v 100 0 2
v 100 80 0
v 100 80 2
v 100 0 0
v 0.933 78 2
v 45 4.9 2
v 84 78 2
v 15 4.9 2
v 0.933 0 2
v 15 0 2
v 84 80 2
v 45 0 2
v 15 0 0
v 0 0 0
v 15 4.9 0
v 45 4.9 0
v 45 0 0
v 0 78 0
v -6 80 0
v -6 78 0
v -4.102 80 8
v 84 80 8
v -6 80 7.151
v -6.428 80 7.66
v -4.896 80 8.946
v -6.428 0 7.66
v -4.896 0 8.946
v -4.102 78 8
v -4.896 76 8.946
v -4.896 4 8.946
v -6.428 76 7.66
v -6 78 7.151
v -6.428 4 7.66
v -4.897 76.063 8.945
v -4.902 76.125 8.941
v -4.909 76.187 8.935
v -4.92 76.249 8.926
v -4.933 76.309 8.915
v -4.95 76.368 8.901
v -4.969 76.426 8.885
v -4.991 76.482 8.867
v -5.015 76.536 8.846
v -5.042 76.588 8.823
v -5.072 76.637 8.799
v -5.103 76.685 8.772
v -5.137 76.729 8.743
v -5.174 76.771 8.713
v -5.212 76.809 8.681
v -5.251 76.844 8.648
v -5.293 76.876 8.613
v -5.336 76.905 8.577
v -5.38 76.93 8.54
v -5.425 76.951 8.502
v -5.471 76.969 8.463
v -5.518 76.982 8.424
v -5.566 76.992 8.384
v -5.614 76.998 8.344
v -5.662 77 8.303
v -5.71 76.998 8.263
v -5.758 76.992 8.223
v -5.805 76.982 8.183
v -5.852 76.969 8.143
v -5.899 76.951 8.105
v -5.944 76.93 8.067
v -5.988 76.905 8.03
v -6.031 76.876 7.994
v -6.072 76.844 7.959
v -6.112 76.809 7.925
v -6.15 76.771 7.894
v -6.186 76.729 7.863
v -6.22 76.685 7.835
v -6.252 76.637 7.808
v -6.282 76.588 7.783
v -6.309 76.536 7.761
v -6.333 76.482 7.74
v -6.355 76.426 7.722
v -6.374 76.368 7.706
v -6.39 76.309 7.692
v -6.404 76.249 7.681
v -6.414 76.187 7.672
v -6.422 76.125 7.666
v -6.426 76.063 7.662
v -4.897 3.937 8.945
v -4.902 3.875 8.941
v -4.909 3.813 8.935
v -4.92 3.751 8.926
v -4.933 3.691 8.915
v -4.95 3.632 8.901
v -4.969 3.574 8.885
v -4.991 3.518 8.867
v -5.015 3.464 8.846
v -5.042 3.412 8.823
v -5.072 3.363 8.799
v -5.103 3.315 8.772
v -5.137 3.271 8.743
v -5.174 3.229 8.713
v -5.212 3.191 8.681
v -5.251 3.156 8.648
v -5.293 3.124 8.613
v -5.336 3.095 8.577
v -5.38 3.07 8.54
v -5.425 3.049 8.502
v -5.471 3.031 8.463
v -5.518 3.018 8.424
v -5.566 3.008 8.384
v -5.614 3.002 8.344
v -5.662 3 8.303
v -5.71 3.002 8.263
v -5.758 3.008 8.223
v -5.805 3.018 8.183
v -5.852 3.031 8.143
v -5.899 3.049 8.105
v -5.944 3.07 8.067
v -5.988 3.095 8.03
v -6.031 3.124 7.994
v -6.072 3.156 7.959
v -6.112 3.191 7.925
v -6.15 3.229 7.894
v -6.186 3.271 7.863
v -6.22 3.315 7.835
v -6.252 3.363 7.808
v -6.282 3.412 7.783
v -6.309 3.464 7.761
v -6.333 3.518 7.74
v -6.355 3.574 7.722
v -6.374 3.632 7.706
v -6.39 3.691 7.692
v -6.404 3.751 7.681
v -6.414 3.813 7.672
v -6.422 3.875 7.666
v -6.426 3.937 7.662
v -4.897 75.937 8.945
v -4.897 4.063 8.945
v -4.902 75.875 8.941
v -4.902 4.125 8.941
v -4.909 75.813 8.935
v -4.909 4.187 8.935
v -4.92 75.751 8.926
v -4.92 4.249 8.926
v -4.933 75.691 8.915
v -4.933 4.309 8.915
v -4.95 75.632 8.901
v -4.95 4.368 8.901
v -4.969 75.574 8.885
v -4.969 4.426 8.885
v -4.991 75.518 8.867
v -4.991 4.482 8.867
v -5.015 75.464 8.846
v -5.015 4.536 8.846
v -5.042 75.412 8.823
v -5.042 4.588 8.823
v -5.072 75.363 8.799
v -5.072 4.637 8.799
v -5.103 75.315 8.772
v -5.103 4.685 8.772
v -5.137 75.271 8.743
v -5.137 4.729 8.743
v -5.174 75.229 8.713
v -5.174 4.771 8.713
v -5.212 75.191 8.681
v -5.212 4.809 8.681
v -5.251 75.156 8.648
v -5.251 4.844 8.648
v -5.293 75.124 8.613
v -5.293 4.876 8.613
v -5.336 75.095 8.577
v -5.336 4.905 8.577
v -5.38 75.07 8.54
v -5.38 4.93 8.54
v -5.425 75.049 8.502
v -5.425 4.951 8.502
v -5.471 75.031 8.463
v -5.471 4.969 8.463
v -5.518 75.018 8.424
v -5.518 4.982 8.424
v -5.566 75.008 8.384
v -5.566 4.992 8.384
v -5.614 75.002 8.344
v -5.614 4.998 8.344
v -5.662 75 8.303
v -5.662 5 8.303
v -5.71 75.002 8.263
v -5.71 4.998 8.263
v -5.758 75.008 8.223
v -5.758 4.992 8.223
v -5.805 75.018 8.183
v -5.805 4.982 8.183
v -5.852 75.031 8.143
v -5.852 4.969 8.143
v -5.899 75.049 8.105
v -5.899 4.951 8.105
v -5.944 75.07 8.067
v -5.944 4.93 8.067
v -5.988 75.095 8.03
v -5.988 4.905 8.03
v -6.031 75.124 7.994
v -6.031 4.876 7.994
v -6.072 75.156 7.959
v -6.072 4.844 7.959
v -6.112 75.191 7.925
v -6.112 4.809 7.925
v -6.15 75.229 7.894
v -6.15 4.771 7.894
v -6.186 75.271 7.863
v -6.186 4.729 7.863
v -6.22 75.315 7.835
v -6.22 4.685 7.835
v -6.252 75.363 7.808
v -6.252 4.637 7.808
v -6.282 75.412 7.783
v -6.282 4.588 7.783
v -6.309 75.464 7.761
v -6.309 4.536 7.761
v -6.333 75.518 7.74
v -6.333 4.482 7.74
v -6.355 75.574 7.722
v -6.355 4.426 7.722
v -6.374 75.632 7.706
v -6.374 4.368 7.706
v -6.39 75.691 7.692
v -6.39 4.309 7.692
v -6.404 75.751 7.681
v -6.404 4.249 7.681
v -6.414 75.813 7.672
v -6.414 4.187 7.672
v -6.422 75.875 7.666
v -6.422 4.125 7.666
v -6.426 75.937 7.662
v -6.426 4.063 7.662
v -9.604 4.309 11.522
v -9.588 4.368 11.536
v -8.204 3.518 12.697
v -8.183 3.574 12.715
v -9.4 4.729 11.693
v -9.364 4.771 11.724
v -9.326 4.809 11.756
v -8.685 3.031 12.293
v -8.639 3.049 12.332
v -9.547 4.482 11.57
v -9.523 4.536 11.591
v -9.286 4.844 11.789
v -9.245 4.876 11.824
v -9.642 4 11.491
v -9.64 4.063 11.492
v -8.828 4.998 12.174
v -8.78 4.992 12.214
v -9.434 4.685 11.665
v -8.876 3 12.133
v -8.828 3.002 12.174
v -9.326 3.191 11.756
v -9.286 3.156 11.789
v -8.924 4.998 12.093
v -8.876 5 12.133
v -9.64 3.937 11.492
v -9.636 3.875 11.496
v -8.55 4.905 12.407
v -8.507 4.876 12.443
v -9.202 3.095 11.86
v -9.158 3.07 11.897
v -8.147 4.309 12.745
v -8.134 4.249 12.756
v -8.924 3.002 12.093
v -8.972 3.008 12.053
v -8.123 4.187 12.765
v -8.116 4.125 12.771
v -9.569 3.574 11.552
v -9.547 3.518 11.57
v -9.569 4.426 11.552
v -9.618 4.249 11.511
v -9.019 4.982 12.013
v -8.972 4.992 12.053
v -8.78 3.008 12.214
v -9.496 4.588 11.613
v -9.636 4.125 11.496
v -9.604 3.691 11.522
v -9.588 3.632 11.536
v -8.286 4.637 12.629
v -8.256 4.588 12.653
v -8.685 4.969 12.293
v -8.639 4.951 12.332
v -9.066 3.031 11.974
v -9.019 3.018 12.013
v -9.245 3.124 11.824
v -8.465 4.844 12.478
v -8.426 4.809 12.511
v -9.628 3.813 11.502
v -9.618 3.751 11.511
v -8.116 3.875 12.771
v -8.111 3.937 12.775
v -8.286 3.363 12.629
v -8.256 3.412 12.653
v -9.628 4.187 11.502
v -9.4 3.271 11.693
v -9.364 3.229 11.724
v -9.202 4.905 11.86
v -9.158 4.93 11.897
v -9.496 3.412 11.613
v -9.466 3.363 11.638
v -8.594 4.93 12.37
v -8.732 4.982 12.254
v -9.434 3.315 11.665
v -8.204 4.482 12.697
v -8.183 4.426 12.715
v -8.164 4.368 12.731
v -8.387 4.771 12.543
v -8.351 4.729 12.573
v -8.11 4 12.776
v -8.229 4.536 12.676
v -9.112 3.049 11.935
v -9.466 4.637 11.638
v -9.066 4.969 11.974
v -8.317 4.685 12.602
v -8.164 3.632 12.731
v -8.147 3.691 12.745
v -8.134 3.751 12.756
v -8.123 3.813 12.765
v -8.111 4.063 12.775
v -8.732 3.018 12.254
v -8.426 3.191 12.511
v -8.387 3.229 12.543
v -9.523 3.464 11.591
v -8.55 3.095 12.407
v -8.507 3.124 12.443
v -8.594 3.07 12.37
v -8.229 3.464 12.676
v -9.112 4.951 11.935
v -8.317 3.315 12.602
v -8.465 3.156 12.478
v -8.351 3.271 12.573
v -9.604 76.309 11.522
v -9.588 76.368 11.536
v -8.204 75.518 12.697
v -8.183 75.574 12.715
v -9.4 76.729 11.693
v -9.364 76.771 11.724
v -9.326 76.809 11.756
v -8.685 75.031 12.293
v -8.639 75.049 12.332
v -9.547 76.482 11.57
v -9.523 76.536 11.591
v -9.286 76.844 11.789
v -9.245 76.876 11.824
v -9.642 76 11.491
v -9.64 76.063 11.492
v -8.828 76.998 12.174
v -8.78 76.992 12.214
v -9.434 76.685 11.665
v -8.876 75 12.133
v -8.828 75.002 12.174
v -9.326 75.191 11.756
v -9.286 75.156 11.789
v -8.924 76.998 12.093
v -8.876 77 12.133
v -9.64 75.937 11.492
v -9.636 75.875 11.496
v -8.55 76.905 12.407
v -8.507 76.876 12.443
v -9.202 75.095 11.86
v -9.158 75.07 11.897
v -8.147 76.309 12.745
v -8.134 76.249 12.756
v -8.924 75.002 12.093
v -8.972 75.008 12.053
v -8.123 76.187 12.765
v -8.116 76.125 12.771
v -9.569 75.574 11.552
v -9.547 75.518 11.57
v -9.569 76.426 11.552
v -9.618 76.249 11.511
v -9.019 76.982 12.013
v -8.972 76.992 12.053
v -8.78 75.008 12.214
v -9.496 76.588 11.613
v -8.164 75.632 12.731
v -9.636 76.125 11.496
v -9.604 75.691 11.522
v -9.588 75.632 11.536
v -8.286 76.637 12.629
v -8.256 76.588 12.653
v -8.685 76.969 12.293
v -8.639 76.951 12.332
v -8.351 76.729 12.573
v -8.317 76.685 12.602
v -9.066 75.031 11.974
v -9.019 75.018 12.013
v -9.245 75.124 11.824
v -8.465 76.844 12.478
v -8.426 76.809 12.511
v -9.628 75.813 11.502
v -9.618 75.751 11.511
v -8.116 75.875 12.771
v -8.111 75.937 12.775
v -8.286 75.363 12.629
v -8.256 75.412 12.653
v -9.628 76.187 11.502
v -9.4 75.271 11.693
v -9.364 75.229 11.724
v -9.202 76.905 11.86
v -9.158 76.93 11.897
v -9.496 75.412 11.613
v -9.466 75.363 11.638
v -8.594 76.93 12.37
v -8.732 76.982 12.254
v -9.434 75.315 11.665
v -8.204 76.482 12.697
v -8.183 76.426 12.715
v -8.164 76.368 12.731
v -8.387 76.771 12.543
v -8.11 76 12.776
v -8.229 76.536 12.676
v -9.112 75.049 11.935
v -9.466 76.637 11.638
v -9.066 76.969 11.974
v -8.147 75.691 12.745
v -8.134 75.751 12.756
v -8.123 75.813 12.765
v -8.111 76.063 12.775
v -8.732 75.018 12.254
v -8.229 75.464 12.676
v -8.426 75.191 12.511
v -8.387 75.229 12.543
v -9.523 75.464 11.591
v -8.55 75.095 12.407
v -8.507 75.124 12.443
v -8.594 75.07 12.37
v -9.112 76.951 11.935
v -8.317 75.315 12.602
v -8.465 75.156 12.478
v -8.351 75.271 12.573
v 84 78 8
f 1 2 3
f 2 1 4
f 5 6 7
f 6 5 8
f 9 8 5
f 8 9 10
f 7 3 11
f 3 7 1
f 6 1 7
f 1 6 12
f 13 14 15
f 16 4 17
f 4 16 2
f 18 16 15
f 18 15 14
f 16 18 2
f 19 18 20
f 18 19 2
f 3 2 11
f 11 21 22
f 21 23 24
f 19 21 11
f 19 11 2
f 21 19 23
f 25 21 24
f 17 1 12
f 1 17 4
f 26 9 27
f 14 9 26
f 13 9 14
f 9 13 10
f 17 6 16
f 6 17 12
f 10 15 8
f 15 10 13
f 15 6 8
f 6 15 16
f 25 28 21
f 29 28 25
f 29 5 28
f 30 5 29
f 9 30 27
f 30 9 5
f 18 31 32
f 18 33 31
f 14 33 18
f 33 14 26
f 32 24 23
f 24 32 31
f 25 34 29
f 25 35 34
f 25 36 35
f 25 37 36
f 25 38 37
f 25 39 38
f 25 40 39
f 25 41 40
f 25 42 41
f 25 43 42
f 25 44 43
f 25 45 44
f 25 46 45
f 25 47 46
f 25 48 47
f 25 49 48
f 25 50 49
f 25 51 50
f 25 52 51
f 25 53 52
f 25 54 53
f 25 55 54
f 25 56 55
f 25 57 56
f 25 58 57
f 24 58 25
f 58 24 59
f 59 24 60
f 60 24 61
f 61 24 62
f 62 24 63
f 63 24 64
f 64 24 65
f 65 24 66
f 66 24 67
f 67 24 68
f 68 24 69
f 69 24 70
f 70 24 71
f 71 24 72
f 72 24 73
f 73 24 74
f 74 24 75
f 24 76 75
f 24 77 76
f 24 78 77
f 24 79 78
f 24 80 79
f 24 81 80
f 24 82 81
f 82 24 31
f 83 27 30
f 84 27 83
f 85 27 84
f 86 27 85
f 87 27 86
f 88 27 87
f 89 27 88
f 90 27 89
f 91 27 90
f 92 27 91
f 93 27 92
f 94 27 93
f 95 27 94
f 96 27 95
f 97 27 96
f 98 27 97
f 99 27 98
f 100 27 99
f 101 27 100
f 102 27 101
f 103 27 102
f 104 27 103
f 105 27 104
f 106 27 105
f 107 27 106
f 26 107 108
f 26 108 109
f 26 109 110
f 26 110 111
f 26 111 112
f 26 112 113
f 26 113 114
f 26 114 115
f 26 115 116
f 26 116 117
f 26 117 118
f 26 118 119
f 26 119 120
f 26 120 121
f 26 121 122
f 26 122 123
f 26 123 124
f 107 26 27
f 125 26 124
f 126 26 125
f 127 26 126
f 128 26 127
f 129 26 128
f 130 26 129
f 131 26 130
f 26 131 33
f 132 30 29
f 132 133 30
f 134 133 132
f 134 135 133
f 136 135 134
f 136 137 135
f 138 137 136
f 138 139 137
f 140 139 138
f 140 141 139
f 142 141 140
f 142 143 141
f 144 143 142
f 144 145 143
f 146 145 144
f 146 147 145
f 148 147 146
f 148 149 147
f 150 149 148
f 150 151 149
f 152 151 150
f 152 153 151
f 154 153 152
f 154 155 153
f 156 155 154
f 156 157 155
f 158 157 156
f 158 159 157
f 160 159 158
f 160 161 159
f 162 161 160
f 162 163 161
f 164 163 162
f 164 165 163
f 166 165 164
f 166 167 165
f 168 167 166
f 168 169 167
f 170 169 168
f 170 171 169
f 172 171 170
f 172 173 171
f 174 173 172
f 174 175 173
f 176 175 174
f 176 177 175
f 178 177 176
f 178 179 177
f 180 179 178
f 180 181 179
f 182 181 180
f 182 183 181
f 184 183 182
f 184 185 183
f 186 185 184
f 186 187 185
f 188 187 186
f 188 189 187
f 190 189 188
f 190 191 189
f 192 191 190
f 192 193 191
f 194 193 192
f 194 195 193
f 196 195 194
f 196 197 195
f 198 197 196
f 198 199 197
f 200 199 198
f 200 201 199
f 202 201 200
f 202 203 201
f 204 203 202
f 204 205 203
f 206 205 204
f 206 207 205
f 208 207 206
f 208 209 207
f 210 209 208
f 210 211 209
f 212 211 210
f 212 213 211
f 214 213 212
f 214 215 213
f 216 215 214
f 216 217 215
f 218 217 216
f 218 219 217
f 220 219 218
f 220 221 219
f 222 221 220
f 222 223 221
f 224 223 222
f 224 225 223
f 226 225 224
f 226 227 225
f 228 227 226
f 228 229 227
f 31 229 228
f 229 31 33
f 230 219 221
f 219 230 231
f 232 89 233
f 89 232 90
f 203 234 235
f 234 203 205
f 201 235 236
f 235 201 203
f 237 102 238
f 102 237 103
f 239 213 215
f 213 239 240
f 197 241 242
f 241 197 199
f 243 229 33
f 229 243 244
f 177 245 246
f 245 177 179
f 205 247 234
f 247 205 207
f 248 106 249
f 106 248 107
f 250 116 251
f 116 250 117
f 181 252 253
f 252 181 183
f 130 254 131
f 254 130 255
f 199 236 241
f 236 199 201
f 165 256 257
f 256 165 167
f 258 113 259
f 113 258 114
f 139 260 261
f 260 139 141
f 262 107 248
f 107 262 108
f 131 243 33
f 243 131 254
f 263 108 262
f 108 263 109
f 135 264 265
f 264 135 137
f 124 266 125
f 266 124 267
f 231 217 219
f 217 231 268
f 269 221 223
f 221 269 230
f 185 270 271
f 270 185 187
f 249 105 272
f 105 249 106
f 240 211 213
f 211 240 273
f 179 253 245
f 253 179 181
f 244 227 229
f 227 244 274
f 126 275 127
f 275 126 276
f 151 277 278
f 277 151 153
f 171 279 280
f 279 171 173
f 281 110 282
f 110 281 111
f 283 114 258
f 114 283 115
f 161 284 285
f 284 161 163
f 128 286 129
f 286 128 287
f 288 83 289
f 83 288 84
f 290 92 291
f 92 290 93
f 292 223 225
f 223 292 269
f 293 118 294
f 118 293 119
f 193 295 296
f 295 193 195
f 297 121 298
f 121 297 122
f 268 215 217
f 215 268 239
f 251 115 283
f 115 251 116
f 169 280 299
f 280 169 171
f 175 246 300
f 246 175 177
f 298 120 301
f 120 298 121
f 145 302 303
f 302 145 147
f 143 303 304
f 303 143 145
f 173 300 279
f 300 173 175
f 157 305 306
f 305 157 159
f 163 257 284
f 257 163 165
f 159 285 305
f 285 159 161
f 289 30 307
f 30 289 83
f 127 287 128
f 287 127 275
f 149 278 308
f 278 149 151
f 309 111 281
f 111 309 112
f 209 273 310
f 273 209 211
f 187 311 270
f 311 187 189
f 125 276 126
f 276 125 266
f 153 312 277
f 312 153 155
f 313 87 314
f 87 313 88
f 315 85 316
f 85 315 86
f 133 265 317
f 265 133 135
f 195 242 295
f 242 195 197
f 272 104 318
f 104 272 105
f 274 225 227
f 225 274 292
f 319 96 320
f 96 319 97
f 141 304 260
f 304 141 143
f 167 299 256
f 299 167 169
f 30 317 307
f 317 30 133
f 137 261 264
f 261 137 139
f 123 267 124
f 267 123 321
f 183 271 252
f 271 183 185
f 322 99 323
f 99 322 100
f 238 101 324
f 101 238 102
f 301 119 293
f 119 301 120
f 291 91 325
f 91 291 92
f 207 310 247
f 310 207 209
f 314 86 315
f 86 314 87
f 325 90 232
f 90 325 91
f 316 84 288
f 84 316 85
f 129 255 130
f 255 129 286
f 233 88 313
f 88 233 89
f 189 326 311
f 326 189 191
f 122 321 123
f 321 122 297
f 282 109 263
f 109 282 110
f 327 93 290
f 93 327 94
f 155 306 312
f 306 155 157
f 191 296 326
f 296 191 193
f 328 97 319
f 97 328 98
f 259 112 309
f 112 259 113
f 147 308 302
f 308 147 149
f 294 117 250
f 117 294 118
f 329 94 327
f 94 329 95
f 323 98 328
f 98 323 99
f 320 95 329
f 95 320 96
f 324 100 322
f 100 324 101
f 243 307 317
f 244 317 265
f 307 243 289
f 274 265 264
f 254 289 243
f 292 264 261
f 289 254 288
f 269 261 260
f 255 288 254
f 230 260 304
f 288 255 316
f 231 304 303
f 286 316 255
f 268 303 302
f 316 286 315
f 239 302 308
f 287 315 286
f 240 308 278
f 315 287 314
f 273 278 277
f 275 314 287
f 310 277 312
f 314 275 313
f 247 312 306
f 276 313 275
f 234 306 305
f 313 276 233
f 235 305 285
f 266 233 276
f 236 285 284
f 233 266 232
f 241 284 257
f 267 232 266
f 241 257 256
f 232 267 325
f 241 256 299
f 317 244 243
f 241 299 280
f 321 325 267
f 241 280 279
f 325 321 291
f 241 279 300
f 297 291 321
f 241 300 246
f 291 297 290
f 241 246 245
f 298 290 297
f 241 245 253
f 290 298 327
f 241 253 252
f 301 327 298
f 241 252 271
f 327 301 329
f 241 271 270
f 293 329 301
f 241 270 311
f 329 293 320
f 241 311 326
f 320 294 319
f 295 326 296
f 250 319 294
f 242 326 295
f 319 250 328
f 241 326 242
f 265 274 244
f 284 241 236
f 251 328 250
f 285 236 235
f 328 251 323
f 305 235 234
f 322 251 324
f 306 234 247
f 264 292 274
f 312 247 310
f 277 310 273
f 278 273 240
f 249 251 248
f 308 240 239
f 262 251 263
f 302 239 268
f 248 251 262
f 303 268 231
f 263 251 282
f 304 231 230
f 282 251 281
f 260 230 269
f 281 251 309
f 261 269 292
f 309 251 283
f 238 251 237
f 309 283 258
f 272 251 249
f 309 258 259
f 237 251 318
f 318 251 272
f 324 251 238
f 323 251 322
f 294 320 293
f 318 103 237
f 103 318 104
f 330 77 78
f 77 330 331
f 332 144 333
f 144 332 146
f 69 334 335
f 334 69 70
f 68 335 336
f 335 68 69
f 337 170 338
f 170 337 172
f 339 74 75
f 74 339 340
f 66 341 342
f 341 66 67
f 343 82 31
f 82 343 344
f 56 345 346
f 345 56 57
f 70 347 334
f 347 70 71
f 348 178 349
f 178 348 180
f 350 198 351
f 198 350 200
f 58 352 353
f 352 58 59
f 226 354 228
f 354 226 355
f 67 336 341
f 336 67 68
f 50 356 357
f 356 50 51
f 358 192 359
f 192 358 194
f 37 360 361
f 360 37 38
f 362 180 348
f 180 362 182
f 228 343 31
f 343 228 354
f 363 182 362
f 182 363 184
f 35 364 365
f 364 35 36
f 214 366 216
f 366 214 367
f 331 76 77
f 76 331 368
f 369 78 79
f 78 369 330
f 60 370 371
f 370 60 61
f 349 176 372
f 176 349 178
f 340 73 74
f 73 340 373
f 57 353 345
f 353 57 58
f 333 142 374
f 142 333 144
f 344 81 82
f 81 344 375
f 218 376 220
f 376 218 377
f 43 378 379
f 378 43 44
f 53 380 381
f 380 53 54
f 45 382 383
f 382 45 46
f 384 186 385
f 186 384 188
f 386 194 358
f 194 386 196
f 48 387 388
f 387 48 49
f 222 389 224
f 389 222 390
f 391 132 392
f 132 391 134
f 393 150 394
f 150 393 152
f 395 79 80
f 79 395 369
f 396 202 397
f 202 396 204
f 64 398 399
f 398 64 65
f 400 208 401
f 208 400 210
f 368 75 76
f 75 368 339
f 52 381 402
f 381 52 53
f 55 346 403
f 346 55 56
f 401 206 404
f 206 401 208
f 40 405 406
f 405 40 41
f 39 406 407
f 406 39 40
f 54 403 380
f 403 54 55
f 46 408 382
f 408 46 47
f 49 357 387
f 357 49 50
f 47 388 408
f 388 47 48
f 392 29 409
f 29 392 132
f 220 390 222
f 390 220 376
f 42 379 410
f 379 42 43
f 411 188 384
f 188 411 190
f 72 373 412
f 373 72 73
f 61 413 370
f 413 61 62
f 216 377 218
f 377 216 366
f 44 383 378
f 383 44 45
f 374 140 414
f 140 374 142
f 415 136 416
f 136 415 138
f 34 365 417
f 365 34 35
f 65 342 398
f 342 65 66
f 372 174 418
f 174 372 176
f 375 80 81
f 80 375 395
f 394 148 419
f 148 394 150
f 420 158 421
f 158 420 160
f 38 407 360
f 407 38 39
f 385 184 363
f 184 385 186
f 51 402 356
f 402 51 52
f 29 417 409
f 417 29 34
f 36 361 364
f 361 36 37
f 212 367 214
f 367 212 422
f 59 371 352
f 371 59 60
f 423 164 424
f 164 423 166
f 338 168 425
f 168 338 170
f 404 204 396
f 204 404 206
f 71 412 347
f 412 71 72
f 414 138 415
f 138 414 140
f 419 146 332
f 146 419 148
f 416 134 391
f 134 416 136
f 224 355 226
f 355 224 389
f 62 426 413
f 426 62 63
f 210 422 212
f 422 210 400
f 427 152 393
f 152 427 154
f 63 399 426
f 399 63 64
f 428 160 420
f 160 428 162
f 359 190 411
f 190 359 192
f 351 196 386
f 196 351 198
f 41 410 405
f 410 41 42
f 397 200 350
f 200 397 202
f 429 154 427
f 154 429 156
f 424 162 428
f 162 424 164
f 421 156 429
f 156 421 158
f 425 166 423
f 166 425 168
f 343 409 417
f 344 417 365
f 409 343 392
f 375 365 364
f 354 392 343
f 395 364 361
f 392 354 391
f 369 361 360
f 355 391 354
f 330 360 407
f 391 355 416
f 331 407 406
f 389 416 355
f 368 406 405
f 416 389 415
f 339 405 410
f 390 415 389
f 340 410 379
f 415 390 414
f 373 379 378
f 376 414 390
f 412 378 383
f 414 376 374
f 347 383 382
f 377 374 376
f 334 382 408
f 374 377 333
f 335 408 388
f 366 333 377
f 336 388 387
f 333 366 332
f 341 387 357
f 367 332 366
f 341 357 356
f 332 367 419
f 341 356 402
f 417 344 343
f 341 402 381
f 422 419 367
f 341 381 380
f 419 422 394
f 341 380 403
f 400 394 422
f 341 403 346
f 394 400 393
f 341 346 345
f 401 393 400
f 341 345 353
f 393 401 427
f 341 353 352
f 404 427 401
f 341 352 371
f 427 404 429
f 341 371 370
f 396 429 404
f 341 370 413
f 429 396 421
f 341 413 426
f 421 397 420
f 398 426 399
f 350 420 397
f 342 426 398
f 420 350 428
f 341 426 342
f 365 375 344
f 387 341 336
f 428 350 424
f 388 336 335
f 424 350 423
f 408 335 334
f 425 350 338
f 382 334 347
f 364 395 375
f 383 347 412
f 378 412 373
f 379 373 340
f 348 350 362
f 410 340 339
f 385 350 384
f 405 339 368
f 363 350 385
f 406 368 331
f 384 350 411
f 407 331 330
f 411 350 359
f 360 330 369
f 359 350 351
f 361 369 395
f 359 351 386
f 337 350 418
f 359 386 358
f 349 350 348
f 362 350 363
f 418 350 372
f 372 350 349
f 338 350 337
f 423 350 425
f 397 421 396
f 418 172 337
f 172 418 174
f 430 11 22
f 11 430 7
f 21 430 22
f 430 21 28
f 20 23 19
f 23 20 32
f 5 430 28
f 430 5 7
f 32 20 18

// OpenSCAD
// --- parameters

$fn=100;
height = 80;
width = 110;
thinkness = 2;
widthCables = 30;

// ----
difference() {
    // main plate
    cube([width-10, height, thinkness]);
    // for the cables
    translate([15, -0.1, -5]) {
        cube([widthCables, 5, 10]);
    }
}
// small curve
rotate([0,50,0]) {
    translate([-10, 0, 0]) {
        cube([10, height, thinkness]);
        translate([-5, 4, 1]) {
            rotate([0, 90, 0]) {
                cylinder(h=10, d=2);
            }
        }
        translate([-5, height-4, 1]) {
            rotate([0, 90, 0]) {
                cylinder(h=10, d=2);
            }
        }
    }
}
// bottom
translate([-6, height - thinkness, 0]) {
    cube([width-20, thinkness, 8]);
}
